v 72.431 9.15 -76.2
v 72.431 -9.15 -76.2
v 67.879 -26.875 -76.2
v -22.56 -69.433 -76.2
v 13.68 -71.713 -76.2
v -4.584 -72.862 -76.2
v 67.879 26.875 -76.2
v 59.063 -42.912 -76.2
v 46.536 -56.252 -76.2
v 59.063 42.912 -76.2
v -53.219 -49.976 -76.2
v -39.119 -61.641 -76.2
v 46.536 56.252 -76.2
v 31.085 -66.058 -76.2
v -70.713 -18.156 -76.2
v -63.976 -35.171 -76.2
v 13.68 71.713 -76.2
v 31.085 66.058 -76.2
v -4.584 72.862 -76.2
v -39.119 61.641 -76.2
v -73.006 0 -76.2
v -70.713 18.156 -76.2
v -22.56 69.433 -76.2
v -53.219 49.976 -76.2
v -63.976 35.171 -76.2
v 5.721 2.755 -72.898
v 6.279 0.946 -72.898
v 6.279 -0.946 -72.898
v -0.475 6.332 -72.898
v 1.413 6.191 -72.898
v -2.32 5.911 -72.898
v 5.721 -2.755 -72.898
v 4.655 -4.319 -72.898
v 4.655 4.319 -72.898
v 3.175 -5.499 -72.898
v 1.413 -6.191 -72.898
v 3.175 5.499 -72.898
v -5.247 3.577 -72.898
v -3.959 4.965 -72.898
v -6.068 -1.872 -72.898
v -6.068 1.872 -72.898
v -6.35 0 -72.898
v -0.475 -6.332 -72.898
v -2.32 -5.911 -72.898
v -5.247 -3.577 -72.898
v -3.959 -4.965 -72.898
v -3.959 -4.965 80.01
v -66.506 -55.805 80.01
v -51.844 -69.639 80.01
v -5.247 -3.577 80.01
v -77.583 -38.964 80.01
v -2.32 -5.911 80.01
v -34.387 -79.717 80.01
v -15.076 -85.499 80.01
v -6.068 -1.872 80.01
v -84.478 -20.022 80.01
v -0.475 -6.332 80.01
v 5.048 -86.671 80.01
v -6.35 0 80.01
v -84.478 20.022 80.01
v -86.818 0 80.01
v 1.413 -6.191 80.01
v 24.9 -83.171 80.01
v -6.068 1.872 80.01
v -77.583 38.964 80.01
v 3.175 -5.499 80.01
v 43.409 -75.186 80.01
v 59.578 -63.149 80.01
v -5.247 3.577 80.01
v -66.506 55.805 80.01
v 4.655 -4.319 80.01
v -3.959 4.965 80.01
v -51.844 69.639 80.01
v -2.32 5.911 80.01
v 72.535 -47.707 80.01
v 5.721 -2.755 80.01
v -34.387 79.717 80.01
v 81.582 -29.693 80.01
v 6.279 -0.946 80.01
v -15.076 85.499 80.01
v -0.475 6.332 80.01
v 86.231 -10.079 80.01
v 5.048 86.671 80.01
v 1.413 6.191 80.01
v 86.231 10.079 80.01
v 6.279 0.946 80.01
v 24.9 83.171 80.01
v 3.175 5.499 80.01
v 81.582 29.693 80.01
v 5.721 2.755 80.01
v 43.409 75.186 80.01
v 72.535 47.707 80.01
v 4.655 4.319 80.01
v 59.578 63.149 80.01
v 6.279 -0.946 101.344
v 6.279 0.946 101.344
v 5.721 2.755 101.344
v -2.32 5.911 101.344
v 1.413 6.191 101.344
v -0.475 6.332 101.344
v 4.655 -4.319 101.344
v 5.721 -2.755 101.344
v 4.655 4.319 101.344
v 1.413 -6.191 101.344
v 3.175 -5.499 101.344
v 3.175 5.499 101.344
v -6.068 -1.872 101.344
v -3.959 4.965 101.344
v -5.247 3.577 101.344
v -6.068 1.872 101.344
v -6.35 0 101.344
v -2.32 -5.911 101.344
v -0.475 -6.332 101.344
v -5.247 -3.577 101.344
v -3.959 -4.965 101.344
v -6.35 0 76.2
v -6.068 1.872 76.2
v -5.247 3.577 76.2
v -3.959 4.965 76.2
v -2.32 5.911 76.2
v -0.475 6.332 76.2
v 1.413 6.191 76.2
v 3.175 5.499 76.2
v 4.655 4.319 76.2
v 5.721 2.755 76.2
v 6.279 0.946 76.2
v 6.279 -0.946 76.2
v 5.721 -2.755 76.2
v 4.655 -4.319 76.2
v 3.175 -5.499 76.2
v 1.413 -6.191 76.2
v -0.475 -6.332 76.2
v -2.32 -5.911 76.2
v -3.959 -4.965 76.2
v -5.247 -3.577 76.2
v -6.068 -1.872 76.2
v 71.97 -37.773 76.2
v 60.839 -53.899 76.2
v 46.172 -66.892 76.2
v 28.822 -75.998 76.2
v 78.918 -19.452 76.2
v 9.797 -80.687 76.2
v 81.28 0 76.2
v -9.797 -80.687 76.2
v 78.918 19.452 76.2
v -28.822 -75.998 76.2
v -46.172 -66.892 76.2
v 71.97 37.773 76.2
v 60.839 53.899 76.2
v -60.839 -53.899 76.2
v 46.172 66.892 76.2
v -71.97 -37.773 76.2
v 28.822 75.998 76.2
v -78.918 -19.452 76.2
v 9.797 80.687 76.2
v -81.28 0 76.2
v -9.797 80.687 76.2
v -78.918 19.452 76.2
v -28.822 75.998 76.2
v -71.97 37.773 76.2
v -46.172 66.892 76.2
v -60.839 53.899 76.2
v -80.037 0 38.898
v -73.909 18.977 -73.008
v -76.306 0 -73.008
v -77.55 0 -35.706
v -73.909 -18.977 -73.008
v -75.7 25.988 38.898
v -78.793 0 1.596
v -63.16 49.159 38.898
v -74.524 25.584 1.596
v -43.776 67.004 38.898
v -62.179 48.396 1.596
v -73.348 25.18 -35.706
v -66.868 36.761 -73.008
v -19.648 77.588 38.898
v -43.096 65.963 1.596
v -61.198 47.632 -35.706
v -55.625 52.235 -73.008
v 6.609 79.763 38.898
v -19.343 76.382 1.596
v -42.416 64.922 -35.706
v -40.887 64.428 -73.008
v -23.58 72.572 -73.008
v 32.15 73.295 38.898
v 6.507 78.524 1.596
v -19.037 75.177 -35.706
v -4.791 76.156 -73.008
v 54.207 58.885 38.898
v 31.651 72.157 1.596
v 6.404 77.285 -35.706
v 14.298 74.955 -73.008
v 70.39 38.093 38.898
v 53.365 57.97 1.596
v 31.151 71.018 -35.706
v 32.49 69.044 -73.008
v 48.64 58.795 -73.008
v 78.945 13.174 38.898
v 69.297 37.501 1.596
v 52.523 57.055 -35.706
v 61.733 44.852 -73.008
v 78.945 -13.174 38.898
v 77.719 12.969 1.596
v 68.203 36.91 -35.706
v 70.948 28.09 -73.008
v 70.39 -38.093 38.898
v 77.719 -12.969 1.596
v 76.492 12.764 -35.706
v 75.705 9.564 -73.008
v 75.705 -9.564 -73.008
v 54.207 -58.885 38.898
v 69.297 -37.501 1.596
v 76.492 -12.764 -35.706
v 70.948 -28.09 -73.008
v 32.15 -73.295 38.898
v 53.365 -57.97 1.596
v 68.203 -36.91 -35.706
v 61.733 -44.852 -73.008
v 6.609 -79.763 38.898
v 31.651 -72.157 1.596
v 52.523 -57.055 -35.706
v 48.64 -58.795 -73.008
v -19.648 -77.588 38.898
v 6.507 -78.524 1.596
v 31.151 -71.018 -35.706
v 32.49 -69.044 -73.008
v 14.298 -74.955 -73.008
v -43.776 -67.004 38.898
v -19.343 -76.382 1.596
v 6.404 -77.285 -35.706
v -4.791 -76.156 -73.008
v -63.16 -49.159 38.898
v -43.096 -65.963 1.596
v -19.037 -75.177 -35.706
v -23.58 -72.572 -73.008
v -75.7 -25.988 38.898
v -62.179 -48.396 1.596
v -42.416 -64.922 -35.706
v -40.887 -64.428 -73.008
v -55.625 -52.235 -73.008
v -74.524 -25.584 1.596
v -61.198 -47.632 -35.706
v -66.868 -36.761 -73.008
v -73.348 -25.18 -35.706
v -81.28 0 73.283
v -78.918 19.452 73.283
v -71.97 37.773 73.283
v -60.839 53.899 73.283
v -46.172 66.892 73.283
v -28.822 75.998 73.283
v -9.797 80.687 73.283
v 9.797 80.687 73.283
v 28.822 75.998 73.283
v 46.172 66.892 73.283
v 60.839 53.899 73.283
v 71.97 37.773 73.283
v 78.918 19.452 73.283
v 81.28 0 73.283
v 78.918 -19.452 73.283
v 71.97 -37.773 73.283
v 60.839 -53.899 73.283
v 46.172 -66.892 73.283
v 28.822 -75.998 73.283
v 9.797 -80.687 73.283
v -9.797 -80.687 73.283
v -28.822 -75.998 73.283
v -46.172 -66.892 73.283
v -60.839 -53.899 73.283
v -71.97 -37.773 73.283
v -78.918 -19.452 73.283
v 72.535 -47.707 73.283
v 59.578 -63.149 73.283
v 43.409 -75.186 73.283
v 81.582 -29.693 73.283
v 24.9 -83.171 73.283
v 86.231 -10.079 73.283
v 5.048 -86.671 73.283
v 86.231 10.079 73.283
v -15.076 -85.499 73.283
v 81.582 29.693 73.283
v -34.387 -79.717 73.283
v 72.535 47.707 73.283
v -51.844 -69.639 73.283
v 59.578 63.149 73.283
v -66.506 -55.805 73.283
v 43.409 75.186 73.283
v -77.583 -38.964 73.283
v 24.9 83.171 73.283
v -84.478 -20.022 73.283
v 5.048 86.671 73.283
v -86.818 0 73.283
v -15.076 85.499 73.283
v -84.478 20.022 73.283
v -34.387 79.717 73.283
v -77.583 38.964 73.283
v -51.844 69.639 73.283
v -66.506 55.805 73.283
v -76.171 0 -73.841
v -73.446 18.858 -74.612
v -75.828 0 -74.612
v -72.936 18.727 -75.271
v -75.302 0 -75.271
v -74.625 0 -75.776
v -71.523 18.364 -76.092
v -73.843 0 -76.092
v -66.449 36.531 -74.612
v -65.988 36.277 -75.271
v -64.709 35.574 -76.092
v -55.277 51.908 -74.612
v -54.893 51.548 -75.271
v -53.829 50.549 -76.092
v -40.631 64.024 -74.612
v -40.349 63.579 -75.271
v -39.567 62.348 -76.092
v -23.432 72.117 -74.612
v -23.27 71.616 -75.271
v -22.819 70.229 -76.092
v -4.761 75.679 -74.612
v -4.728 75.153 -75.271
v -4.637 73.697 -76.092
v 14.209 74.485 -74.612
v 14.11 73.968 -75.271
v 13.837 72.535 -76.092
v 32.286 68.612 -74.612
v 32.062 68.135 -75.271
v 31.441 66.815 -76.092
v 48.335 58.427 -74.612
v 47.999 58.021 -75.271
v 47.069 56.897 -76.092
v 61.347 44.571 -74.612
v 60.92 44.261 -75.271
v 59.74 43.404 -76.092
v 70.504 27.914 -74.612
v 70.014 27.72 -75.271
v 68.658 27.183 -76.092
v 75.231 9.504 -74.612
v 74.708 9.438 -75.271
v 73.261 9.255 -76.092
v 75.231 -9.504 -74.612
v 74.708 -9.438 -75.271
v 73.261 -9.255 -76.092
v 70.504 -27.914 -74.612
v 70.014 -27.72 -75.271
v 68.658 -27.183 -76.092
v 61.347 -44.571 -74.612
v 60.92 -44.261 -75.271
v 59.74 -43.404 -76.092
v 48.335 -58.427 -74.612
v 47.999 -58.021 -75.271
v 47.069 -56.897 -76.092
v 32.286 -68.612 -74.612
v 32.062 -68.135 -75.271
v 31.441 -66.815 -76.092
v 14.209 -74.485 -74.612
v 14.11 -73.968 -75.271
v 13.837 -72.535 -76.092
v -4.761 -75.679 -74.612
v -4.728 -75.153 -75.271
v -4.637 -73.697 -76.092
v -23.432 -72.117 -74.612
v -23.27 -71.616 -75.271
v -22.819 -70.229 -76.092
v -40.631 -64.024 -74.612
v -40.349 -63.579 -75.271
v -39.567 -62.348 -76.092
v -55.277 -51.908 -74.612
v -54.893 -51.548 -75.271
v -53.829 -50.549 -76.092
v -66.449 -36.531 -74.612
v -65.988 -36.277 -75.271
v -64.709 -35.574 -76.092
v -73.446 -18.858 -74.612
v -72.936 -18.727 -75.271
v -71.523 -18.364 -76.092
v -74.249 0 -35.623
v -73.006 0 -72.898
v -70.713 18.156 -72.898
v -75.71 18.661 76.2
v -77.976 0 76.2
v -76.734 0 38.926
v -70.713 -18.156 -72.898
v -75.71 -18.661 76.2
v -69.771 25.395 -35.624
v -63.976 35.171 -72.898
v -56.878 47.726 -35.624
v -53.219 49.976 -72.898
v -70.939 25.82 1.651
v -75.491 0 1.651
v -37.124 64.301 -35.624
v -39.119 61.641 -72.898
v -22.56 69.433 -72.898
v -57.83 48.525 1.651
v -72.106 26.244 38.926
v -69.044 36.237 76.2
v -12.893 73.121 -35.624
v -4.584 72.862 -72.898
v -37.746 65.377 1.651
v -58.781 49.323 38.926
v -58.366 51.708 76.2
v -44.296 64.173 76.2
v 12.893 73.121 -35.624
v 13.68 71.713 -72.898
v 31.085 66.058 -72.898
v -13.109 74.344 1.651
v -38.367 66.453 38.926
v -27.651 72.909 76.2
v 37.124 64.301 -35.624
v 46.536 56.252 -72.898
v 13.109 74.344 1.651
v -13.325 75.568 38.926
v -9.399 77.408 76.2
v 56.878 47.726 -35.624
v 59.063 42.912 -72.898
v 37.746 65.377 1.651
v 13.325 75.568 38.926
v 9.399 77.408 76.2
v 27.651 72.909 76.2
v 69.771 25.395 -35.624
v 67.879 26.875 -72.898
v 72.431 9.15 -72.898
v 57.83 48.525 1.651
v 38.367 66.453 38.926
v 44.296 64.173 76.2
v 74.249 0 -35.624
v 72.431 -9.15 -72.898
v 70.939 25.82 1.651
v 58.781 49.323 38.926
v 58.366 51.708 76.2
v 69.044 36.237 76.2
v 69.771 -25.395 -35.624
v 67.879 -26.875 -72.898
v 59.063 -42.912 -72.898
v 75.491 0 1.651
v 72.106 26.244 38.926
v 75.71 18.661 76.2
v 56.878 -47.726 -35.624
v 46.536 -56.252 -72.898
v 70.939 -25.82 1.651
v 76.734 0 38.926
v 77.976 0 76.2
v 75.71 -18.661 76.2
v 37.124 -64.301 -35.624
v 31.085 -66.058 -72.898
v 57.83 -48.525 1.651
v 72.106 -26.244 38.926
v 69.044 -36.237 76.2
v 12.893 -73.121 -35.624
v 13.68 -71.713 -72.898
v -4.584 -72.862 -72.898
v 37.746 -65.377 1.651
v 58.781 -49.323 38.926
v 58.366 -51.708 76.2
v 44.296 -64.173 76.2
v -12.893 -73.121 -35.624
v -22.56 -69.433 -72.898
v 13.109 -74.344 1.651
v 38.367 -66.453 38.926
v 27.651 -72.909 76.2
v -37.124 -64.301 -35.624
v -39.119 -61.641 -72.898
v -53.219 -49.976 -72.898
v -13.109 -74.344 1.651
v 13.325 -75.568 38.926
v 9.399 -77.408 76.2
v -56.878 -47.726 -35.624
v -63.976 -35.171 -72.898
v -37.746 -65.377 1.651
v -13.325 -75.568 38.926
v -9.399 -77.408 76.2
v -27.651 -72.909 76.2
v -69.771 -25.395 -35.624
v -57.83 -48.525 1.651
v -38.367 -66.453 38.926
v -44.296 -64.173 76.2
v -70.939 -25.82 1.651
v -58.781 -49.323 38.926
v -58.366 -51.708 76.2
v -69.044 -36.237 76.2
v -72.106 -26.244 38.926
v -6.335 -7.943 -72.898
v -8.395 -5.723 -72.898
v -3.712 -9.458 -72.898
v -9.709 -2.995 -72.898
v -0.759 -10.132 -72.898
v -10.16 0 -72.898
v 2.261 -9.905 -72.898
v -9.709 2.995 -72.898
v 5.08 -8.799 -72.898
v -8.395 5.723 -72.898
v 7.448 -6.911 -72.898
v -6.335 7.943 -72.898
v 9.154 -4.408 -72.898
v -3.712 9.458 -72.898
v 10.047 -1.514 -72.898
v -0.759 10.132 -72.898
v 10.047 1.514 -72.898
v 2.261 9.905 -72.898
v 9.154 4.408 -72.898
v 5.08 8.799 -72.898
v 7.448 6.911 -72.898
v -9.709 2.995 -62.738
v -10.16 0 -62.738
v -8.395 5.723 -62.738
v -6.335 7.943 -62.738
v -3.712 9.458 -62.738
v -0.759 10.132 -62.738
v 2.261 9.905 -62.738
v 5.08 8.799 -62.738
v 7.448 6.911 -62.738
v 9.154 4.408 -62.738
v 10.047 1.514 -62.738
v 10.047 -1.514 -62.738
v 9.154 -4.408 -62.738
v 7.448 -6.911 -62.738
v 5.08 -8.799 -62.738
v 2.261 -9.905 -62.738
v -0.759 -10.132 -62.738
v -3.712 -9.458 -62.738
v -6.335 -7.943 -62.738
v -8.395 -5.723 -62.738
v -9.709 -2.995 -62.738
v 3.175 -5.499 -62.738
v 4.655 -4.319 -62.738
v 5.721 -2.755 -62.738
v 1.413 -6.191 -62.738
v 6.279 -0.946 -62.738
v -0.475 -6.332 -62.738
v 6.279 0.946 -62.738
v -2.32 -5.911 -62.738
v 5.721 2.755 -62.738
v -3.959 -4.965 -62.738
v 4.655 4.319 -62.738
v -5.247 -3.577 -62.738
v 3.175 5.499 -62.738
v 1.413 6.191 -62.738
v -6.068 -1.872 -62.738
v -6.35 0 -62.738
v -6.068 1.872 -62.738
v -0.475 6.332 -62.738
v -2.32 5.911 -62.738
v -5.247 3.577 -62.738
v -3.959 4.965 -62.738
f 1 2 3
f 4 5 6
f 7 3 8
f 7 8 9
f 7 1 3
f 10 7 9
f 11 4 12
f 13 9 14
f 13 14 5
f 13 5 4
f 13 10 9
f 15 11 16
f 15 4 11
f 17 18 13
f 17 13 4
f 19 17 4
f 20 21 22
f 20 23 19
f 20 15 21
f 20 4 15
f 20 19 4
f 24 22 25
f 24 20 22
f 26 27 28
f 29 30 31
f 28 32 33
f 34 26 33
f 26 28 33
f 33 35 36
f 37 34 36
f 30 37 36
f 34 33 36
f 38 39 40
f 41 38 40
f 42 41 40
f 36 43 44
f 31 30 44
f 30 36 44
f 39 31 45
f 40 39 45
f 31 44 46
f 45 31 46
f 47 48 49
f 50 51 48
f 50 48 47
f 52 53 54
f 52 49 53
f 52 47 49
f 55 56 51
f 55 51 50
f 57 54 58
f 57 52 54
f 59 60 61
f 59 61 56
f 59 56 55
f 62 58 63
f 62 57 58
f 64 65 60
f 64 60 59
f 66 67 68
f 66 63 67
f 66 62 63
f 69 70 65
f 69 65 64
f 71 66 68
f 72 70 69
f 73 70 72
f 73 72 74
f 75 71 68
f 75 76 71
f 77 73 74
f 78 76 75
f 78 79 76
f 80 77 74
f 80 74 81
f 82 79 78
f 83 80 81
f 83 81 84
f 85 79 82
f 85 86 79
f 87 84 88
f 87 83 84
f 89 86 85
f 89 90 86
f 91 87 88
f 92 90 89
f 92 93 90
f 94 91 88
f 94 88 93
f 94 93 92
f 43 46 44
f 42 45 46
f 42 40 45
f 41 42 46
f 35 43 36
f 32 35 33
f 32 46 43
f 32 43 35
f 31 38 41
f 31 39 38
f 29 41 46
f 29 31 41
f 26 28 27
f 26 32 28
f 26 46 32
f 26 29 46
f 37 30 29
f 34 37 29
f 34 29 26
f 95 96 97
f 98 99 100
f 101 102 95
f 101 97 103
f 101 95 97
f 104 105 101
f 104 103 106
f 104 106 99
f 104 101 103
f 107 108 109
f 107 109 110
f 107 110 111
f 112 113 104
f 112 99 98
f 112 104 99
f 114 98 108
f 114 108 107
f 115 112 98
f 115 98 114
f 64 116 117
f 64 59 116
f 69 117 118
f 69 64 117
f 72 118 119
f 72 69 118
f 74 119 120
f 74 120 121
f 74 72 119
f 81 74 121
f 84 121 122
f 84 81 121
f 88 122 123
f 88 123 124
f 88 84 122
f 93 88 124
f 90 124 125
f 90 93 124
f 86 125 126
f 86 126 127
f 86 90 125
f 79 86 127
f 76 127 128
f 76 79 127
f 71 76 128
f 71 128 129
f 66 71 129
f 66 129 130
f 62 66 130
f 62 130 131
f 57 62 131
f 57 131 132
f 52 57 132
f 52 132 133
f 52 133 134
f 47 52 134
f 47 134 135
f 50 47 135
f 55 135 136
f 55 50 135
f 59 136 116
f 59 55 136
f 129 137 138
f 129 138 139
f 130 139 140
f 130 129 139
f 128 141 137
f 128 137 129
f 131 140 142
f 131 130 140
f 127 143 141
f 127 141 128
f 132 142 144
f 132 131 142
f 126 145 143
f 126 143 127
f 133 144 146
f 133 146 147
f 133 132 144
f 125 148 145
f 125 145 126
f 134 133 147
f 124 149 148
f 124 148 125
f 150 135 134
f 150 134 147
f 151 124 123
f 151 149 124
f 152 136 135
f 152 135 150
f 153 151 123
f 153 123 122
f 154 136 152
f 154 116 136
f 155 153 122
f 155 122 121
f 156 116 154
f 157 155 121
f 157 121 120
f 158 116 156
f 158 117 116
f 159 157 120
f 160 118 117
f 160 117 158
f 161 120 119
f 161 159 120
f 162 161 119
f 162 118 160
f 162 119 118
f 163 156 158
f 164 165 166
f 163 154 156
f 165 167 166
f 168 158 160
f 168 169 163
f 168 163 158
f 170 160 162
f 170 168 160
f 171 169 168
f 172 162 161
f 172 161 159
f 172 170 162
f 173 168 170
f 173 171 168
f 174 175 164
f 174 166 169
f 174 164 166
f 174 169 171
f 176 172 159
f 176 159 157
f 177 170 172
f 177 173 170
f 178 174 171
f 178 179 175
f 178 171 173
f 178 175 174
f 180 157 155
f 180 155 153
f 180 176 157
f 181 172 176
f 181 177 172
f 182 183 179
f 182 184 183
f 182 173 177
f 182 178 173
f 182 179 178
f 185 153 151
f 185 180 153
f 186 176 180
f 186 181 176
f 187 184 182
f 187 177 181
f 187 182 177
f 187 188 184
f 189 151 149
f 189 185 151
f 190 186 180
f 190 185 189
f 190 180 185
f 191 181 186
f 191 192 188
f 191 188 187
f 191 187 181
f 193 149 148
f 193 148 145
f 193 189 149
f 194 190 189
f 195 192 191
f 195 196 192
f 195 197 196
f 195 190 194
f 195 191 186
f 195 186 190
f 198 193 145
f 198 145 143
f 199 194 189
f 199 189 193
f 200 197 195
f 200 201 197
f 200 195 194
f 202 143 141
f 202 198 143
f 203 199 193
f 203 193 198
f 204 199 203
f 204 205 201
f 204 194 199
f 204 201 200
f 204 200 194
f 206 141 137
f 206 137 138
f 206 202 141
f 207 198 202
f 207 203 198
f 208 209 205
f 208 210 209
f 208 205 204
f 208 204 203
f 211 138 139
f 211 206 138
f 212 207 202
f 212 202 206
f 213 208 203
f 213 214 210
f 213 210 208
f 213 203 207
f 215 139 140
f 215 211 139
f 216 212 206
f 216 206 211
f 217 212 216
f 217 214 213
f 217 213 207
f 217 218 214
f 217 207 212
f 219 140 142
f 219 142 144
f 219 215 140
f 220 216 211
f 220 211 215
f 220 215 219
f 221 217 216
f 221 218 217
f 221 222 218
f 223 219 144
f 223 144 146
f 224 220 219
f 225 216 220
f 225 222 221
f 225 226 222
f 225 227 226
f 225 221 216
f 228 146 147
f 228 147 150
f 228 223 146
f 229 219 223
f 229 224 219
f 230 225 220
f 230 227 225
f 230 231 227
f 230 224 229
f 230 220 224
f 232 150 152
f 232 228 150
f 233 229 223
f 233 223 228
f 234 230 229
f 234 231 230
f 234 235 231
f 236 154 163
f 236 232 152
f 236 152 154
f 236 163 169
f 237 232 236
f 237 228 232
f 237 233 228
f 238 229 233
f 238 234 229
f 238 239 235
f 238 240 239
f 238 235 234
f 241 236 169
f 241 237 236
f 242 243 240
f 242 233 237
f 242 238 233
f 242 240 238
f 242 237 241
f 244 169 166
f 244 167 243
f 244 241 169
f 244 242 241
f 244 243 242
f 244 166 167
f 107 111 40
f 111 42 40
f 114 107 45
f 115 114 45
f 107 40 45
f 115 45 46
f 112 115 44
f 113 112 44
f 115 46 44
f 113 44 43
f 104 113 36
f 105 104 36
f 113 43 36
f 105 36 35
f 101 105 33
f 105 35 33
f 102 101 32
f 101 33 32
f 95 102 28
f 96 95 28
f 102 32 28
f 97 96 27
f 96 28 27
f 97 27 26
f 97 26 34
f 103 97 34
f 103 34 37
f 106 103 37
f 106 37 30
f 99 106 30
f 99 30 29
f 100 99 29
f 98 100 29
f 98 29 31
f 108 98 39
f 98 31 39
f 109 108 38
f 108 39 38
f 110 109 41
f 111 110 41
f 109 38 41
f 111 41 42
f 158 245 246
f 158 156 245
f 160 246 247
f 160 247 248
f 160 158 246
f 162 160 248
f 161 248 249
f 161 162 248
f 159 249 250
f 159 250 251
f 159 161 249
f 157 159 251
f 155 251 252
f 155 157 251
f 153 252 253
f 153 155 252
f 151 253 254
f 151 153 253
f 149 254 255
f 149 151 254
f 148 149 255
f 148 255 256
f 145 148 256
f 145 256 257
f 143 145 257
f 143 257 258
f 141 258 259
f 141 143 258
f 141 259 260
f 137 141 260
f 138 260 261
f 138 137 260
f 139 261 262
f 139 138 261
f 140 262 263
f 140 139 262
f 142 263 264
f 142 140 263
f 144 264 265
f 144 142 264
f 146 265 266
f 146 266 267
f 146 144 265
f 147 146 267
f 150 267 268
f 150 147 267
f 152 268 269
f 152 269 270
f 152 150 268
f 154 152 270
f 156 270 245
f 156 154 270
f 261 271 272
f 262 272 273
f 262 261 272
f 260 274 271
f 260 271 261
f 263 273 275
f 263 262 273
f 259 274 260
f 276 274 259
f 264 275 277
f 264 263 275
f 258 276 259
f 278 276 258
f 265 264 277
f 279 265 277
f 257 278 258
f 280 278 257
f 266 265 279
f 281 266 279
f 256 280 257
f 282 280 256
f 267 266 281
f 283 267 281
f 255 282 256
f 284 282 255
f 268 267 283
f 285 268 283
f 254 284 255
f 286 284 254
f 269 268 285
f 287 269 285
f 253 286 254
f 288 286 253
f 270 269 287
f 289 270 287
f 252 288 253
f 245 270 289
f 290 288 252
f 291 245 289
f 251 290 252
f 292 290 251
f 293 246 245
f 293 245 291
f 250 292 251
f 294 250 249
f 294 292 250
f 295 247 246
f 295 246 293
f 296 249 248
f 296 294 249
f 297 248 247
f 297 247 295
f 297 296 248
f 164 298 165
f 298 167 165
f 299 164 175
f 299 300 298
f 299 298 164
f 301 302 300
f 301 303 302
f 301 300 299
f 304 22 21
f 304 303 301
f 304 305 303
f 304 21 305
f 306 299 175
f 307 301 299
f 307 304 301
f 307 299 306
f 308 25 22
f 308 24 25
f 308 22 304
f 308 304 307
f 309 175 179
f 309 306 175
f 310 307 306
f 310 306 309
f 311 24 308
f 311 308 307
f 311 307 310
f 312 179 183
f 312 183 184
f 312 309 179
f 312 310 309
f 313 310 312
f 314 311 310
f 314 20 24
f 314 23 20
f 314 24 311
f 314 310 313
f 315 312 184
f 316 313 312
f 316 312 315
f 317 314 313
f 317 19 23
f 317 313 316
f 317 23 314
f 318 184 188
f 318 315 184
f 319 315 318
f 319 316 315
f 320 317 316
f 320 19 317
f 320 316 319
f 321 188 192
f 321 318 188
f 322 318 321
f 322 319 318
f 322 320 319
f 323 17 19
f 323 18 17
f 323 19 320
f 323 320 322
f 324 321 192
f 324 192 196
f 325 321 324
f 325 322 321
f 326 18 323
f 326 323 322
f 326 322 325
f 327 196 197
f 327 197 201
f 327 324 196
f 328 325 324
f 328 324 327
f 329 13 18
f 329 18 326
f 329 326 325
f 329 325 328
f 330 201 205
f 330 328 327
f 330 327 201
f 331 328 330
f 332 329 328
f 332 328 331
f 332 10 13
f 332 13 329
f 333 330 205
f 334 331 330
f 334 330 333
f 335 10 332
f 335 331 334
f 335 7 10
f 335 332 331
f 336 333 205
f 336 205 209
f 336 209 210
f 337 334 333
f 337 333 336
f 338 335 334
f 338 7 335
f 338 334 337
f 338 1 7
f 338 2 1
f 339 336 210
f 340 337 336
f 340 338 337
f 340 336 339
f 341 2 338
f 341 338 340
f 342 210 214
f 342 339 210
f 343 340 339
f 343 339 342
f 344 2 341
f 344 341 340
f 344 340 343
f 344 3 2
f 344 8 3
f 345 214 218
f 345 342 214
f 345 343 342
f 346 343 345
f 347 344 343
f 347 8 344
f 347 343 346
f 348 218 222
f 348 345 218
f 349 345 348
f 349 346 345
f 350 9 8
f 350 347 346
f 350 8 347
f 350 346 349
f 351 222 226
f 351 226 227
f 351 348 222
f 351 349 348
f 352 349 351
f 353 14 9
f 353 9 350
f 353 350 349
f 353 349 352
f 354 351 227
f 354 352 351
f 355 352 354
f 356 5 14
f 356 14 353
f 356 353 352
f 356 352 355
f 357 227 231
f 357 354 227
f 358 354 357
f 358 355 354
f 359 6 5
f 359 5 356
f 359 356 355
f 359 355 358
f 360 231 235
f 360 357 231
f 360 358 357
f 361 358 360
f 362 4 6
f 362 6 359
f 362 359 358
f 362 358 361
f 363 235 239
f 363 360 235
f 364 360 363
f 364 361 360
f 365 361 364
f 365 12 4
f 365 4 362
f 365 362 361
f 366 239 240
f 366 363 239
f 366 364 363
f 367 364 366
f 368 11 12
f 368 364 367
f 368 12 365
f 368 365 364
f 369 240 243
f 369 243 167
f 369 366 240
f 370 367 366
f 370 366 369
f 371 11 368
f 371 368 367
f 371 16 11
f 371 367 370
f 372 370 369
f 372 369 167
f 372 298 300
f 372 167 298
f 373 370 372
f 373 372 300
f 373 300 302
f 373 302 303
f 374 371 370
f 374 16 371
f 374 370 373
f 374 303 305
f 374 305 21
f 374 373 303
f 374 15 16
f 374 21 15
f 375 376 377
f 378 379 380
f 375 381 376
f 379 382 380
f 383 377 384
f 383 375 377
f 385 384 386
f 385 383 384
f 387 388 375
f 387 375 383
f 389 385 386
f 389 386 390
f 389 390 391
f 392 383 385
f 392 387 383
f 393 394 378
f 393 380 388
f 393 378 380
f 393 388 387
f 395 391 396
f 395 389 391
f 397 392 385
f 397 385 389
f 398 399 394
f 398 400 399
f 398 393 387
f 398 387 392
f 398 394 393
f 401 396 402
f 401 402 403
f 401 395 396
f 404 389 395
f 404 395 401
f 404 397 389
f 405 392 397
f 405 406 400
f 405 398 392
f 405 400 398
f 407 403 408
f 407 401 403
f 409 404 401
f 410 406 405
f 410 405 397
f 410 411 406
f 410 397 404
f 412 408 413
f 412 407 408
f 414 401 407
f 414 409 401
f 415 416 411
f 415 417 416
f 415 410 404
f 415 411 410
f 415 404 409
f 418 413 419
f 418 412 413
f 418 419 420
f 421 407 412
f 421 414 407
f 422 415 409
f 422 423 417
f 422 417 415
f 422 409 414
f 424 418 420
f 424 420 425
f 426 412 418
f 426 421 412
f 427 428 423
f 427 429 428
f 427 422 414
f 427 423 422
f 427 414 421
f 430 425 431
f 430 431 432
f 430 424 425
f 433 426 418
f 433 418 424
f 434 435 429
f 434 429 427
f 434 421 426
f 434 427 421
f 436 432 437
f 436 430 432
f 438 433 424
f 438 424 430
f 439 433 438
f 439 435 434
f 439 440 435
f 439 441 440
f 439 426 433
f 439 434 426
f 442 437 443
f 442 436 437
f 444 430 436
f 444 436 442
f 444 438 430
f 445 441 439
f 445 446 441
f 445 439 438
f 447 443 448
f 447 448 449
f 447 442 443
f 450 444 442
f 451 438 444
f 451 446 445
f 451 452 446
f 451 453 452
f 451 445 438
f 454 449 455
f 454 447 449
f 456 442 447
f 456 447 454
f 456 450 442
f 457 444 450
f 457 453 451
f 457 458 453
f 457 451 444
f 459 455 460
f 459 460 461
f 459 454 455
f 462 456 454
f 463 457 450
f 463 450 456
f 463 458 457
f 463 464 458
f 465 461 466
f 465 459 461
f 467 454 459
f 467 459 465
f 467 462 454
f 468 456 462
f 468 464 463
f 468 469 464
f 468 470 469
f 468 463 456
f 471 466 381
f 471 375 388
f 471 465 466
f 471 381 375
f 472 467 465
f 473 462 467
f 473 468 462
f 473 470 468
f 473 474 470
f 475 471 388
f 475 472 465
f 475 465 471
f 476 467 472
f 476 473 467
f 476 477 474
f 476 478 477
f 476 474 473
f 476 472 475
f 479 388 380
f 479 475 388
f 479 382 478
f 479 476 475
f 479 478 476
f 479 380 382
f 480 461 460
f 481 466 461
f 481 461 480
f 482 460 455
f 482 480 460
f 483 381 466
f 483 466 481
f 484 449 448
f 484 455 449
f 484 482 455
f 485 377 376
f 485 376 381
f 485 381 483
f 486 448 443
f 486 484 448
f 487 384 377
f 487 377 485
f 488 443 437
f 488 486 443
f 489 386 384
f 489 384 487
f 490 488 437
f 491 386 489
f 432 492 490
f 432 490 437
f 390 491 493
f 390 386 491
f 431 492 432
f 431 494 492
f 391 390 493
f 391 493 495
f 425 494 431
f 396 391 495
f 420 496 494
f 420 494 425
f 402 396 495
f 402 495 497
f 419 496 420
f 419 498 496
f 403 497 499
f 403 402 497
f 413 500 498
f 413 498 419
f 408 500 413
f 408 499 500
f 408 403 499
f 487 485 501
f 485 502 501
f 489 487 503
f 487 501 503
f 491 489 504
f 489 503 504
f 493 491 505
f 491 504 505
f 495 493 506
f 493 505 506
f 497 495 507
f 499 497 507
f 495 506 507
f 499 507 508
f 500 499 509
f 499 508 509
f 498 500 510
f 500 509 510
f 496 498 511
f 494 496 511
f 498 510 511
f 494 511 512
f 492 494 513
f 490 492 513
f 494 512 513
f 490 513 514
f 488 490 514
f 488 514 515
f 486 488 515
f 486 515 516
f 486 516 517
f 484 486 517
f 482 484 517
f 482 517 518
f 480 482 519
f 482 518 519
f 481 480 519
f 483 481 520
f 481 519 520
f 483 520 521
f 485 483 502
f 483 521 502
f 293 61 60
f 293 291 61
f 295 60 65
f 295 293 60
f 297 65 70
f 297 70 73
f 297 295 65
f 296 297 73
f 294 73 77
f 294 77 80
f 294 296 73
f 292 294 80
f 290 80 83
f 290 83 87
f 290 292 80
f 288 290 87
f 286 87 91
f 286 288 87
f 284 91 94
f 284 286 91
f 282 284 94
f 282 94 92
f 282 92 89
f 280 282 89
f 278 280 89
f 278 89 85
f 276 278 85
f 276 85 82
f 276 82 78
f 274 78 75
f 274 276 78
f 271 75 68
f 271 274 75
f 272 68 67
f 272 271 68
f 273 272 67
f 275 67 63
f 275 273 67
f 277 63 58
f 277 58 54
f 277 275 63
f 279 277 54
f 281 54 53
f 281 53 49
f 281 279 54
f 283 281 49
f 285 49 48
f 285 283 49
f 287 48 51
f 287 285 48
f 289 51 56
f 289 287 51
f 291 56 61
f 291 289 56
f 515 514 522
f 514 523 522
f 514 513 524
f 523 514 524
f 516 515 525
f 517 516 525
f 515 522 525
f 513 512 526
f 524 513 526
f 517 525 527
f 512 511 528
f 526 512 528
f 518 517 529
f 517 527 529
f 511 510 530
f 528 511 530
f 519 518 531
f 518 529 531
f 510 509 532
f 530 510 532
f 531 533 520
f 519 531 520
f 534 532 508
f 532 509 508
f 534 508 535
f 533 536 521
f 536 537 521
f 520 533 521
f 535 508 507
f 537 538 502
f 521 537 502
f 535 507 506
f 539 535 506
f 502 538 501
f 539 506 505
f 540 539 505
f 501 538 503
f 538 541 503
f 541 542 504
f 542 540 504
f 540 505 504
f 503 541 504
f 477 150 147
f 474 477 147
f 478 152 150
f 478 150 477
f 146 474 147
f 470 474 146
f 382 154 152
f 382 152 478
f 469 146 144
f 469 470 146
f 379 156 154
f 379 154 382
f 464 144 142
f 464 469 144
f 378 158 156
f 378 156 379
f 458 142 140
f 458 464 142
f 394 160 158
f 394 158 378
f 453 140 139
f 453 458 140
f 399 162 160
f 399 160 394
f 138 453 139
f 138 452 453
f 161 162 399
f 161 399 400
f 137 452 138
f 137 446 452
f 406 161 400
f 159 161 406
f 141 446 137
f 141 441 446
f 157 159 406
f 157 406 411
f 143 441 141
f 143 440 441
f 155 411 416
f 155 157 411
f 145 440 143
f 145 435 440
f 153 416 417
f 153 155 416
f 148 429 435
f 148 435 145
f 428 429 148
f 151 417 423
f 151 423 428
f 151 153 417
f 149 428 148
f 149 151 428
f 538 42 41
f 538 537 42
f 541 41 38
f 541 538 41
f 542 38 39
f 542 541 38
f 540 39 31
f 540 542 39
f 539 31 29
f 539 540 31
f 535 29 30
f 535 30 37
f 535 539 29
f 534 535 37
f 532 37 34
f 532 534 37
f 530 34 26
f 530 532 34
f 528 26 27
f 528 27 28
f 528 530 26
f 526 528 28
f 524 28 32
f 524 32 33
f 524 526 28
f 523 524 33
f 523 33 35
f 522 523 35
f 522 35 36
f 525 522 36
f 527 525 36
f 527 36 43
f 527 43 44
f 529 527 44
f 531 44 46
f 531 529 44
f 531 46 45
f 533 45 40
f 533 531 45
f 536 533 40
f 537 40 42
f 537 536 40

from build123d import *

# Parameters (mm, degrees)
F0_W   = 3.81
F0_H   = 10.16
F0_W_2 = 6.35
F0_H_2 = 21.3337882066
F0_H_3 = 3.81


with BuildPart() as f1:
    # F0 (on Front) → F1 (revolve)
    with BuildSketch(Plane.XZ):
        with BuildLine():
            Line((0, -76.2), (0, -72.898))
            Line((0, -72.898), (-6.35, -72.898))
            Line((-6.35, -72.898), (-10.16, -72.898))
            Line((-10.16, -72.898), (-73.0062327315, -72.898))
            Line((-73.0062327315, -72.898), (-77.9761660648, 76.2))
            Line((-77.9761660648, 76.2), (-81.28, 76.2))
            Line((-81.28, 76.2), (-76.3063998144, -73.0080055694))
            ThreePointArc((-76.3063998144, -73.0080055694), (-75.301877043, -75.2714407924), (-73.0062327315, -76.2))
            Line((-73.0062327315, -76.2), (0, -76.2))
        make_face()
        with Locations((-8.255, -67.818)):
            Rectangle(F0_W, F0_H)
    revolve(axis=Axis((0, 0, 0), (0, 0, -1)))


with BuildPart() as f2:
    # F0 (on Front) → F2 (revolve)
    with BuildSketch(Plane.XZ):
        Polygon((-77.9761660648, 76.2), (-6.35, 76.2), (-6.35, 80.01), (-86.8177935481, 80.01), (-86.8177935481, 73.2827782631), (-81.28, 73.2827782631), (-81.28, 76.2), align=None)
    revolve(axis=Axis((0, 0, 0), (0, 0, -1)))


with BuildPart() as f3:
    # F0 (on Front) → F3 (revolve)
    with BuildSketch(Plane.XZ):
        with Locations((-3.175, 90.6768941033)):
            Rectangle(F0_W_2, F0_H_2)
        with Locations((-3.175, 78.105)):
            Rectangle(F0_W_2, F0_H_3)
        Polygon((0, -72.898), (0, 76.2), (-6.35, 76.2), (-6.35, -62.738), (-6.35, -72.898), align=None)
    revolve(axis=Axis((0, 0, 14.2228941033), (0, 0, 1)))


solid = Compound([f1.part, f2.part, f3.part])
